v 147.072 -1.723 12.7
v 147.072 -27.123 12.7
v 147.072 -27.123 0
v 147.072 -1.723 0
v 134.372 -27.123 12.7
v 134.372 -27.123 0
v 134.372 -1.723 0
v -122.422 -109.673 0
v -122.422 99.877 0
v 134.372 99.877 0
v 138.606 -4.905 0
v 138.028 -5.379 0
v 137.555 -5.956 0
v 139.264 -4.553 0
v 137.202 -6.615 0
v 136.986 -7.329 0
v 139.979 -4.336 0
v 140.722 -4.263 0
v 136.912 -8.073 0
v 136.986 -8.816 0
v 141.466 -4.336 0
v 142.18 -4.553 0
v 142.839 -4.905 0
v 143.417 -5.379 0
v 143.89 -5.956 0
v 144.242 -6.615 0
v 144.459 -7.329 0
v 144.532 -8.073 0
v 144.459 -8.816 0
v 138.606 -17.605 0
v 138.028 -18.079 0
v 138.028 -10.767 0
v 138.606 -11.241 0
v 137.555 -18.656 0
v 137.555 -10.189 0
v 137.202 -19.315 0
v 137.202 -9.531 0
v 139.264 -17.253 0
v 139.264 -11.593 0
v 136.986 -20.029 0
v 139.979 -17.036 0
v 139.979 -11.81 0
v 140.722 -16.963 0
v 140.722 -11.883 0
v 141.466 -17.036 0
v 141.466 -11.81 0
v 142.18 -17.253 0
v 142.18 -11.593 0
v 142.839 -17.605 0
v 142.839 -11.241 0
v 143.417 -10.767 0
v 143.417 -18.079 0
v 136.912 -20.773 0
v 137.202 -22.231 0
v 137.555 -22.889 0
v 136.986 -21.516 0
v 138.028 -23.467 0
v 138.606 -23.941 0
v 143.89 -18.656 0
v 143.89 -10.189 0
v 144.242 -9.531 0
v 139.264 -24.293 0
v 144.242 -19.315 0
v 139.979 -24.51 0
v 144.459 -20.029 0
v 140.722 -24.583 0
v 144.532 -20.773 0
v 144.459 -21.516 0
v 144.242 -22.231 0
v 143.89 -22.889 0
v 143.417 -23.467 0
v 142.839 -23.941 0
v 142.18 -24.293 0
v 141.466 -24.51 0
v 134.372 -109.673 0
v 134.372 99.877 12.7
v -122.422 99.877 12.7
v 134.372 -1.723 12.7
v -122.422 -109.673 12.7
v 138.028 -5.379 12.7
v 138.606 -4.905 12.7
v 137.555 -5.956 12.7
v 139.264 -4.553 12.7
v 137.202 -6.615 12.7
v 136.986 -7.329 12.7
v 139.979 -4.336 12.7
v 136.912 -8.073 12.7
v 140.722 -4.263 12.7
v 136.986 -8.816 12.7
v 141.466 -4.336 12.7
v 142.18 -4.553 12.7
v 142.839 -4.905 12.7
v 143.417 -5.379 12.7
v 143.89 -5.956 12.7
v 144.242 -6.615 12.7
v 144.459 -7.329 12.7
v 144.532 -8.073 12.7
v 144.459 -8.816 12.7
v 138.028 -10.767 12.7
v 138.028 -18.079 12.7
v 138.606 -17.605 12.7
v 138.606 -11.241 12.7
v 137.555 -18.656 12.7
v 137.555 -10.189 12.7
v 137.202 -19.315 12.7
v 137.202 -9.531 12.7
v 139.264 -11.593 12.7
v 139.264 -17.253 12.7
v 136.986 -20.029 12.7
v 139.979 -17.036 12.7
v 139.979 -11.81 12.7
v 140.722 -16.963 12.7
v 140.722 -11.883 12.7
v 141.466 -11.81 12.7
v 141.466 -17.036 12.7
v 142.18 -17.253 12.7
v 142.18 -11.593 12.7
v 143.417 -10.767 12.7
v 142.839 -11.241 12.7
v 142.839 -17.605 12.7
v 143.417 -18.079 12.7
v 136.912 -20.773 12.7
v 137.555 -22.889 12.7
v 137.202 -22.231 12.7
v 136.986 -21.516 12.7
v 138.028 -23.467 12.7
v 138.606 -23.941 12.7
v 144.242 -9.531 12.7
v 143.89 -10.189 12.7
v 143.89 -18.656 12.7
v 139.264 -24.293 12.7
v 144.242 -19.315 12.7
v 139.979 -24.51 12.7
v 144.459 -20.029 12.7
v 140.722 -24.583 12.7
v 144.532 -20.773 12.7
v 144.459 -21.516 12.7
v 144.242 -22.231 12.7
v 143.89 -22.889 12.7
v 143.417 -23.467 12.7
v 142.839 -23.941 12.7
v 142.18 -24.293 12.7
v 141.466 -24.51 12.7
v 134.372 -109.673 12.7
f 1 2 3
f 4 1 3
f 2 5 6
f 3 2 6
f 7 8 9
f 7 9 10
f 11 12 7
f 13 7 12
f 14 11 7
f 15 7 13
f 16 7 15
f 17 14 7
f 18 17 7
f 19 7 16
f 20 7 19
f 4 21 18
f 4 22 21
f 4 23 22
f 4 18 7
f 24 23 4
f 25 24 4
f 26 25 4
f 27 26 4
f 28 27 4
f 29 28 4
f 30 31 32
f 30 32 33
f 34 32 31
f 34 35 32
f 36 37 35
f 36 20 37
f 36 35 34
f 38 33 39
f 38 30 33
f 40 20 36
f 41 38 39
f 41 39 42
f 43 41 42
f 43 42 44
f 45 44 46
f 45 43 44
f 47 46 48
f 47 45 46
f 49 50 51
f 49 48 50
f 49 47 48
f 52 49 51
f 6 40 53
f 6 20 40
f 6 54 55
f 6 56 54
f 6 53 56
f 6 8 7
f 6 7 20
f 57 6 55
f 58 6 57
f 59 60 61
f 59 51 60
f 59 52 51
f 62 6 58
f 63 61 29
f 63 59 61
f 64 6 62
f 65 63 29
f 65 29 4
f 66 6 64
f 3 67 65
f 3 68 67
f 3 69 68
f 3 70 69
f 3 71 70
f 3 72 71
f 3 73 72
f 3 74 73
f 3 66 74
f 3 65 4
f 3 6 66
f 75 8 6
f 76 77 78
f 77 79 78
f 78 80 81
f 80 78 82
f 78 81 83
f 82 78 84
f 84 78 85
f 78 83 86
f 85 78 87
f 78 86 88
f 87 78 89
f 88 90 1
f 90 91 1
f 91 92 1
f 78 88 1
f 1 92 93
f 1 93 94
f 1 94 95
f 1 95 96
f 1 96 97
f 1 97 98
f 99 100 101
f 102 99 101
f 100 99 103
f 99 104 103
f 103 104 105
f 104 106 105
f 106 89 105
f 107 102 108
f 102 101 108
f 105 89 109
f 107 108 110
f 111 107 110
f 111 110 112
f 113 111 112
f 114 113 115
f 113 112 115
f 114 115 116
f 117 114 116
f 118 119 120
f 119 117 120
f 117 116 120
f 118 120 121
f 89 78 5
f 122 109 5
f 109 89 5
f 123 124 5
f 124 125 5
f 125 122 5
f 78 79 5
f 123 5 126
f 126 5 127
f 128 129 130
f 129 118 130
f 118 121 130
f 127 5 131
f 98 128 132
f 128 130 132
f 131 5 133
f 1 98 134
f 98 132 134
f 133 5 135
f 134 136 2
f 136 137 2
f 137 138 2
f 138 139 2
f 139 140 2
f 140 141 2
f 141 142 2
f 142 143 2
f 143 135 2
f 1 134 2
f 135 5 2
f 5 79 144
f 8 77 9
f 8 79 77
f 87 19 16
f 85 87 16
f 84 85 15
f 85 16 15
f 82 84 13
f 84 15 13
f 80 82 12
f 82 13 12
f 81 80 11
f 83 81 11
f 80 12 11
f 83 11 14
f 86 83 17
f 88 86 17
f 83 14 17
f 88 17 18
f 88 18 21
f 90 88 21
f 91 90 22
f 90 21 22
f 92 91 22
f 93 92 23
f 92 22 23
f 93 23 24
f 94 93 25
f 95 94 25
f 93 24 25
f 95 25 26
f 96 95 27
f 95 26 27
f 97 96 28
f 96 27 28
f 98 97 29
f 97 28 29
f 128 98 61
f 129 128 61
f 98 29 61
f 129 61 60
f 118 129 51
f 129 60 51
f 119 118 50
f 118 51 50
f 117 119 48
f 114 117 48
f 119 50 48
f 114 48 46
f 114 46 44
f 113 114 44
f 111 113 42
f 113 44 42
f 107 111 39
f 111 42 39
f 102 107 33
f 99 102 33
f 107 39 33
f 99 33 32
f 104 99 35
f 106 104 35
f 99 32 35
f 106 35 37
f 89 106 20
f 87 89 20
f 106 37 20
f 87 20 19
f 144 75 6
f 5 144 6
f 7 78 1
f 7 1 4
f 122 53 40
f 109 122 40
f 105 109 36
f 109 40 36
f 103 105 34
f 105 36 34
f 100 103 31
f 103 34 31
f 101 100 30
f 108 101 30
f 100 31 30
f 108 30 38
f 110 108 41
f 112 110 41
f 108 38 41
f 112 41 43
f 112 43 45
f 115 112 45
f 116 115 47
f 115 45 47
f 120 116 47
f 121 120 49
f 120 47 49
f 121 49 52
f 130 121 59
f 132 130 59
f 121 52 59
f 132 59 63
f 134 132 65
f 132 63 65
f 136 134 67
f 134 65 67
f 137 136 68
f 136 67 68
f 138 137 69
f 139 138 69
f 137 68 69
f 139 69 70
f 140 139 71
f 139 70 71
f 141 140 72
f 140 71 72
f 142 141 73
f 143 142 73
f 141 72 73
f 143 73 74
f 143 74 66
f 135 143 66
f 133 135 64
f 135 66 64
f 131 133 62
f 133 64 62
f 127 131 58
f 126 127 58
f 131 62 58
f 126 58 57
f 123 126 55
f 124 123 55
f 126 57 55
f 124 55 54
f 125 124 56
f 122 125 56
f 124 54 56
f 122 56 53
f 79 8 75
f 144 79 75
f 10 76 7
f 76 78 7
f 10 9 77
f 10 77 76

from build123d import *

# Parameters (mm, degrees)
SKETCH2_W           = 256.794
SKETCH2_H           = 196.85
BOSS_EXTRUDE1_DEPTH = 12.7
SKETCH3_W           = 12.7
SKETCH3_H           = 25.4
BOSS_EXTRUDE2_DEPTH = 12.7
SKETCH4_R           = 3.81
CUT_EXTRUDE1_DEPTH  = 12.7
SKETCH5_W           = 256.794
SKETCH5_H           = 12.7
BOSS_EXTRUDE3_DEPTH = 12.7


with BuildPart() as part:
    # Sketch2 → Boss-Extrude1 (new body)
    with BuildSketch(Plane.XY):
        with Locations((5.975438209, -11.247712934)):
            Rectangle(SKETCH2_W, SKETCH2_H)
    extrude(amount=BOSS_EXTRUDE1_DEPTH)

    # Sketch3 → Boss-Extrude2 (add)
    with BuildSketch(Plane(origin=(134.372438209, 0, 0), x_dir=(0, 0, -1), z_dir=(1, 0, 0))):
        with Locations((-6.35, -14.422712934)):
            Rectangle(SKETCH3_W, SKETCH3_H)
    extrude(amount=BOSS_EXTRUDE2_DEPTH)

    # Sketch4 → Cut-Extrude1 (cut)
    with BuildSketch(Plane(origin=(0, 0, 0), x_dir=(-1, 0, 0), z_dir=(0, 0, -1))):
        with Locations((-140.722438209, -8.072712934)):
            Circle(SKETCH4_R)
        with Locations((-140.722438209, -20.772712934)):
            Circle(SKETCH4_R)
    extrude(amount=-CUT_EXTRUDE1_DEPTH, mode=Mode.SUBTRACT)

    # Sketch5 → Boss-Extrude3 (add)
    with BuildSketch(Plane(origin=(0, 87.177287066, 0), x_dir=(1, 0, 0), z_dir=(0, 1, 0))):
        with Locations((5.975438209, -6.35)):
            Rectangle(SKETCH5_W, SKETCH5_H)
    extrude(amount=BOSS_EXTRUDE3_DEPTH)


solid = part.part
